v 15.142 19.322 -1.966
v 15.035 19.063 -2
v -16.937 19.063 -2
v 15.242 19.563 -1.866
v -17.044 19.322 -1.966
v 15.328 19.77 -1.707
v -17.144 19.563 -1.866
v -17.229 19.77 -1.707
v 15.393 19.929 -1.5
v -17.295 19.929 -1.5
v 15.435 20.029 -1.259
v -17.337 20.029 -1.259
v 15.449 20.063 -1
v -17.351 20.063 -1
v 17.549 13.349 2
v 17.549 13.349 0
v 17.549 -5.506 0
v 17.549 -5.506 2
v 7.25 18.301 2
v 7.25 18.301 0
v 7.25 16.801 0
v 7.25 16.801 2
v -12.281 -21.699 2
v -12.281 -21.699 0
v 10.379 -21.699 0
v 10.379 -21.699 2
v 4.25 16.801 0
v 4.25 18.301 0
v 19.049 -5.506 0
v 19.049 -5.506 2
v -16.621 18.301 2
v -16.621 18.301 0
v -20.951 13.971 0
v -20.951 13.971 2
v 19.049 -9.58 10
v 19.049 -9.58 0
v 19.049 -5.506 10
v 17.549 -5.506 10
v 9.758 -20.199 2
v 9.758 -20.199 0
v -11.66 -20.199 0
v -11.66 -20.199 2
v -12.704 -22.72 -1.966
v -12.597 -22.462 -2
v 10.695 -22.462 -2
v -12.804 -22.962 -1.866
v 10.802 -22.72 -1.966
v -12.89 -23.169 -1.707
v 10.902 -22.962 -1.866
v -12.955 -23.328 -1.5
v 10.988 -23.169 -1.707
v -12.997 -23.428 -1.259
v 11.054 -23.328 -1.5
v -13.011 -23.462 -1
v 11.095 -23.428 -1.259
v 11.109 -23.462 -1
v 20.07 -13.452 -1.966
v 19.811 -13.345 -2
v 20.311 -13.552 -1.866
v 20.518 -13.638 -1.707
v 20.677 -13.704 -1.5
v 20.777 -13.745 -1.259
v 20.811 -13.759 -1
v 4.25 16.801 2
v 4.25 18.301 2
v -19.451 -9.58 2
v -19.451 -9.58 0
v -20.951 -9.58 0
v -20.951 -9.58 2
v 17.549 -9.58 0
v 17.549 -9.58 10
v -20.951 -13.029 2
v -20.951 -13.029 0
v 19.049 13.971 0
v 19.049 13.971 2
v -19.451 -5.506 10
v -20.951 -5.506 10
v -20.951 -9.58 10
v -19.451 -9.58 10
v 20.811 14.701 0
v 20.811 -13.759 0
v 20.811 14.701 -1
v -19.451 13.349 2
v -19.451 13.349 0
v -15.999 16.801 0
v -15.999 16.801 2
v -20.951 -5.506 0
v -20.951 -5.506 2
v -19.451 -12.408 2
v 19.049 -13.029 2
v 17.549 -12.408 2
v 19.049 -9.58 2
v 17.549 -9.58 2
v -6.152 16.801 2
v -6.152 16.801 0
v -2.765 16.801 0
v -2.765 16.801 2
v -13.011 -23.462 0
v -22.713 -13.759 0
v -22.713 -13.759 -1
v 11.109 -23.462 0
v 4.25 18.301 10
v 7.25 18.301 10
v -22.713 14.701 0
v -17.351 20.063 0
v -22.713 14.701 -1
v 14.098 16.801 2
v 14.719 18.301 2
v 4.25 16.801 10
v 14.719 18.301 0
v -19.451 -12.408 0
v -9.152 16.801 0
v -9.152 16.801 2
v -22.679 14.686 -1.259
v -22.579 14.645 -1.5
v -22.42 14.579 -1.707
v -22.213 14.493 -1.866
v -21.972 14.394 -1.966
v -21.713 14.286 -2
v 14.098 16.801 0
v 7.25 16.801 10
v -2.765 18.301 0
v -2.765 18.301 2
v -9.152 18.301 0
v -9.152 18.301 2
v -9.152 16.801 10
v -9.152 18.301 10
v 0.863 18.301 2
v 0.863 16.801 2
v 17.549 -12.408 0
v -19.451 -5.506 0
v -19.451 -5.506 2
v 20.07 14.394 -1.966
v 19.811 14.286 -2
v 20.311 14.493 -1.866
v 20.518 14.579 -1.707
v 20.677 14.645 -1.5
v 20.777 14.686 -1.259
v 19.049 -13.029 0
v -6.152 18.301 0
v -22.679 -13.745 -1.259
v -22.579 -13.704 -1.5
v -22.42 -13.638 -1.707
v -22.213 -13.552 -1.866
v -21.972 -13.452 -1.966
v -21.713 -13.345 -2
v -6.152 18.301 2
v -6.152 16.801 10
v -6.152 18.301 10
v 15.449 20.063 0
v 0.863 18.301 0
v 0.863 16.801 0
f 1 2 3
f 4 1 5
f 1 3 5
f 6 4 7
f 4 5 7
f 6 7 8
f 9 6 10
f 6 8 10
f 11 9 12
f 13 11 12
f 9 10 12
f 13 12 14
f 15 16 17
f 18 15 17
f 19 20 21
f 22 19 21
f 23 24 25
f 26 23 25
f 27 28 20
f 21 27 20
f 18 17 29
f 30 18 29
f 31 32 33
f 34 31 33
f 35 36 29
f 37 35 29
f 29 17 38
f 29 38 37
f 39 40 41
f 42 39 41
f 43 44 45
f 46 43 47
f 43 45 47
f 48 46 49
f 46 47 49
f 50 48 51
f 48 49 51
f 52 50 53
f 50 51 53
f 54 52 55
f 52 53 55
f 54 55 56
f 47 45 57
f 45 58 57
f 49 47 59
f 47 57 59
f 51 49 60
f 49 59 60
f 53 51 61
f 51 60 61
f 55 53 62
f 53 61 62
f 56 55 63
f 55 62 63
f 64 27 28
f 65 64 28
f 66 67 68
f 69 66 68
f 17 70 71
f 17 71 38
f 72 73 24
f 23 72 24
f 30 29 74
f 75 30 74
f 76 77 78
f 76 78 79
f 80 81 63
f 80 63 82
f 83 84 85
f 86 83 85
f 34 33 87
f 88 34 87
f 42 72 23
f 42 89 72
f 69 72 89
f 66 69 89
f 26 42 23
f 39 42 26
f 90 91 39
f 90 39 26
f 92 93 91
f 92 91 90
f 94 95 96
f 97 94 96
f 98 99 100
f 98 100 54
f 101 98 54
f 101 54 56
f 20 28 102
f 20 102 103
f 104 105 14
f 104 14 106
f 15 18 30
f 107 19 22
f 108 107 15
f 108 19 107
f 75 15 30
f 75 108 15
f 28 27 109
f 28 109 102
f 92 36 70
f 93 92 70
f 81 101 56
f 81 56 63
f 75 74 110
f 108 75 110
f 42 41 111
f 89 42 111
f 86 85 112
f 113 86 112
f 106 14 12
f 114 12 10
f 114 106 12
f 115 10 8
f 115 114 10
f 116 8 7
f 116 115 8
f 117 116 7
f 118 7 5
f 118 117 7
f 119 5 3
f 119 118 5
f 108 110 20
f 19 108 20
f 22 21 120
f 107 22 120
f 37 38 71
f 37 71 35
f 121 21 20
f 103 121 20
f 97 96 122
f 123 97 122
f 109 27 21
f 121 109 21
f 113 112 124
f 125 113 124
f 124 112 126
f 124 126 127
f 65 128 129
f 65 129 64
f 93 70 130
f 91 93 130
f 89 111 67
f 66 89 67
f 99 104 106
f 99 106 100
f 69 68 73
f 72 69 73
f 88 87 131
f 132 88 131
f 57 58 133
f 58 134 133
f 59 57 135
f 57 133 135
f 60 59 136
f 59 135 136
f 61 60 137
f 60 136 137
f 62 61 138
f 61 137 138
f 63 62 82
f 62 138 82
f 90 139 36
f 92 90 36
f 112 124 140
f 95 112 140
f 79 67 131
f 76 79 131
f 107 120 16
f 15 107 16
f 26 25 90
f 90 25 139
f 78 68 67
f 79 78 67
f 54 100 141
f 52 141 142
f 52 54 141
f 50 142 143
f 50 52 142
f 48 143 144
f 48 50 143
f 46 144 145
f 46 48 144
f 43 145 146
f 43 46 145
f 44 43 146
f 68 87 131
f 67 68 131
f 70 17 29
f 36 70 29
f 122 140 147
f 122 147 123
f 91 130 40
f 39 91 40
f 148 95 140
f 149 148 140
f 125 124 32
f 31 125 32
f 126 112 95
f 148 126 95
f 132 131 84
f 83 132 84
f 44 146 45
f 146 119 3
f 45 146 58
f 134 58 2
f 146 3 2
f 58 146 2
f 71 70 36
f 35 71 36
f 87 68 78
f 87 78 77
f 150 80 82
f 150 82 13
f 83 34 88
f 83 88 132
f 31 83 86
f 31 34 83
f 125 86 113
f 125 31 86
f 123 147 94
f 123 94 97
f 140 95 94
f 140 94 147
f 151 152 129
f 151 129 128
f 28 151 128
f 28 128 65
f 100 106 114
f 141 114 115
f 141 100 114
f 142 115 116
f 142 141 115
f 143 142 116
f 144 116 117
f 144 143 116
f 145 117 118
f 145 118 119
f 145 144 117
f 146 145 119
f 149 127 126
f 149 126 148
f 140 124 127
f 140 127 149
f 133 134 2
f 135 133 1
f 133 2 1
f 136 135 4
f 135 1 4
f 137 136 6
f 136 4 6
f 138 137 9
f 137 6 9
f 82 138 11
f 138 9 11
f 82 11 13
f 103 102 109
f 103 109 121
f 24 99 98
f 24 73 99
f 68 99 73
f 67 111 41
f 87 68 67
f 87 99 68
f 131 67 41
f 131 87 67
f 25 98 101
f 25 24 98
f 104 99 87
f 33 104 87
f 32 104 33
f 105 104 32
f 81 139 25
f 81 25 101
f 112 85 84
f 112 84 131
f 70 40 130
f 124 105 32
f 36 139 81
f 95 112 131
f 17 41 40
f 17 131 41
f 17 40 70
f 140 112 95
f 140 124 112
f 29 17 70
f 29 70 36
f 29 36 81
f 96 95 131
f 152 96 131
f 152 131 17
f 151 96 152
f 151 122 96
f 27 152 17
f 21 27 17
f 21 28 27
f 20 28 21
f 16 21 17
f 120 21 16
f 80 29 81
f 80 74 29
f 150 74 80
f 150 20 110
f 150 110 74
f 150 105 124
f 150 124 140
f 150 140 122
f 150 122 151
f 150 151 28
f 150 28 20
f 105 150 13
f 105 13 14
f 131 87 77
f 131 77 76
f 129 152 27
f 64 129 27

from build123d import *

# Parameters (mm, degrees)
F0_W     = 1.4999995628
F0_H     = 4.0733087808
F0_W_2   = 3
F0_H_2   = 1.4999995628
F0_W_3   = 3.3865806442
F0_W_4   = 3.6284167378
F1_DEPTH = 2
F2_DEPTH = 2
F3_DEPTH = 10
F4_R     = 1


# Not quite as in the source:
# - a feature names something its author has since deleted; it is built from what else it names


with BuildPart() as f1:
    # F0 (on Top) → F1 (new body)
    with BuildSketch(Plane.XY):
        Polygon((-22.7132121537, 14.7005723555), (-22.7132121537, -13.7593665438), (-13.0109889089, -23.4615897885), (11.1091688922, -23.4615897885), (20.811392137, -13.7593665438), (20.811392137, 14.7005723555), (15.4489499903, 20.0630145022), (-17.350770007, 20.0630145022), align=None)
        Polygon((19.0490899916, -13.0293970941), (10.3791994426, -21.6992876432), (-12.2810194593, -21.6992876432), (-20.9509100084, -13.0293970941), (-20.9509100084, -9.5797898248), (-20.9509100084, -5.506481044), (-20.9509100084, 13.9706029059), (-16.6208005574, 18.3007123568), (-9.1516990215, 18.3007123568), (-6.1516990215, 18.3007123568), (-2.7651183773, 18.3007123568), (0.8632983606, 18.3007123568), (4.2498790047, 18.3007123568), (7.2498790047, 18.3007123568), (14.7189805407, 18.3007123568), (19.0490899916, 13.9706029059), (19.0490899916, -5.506481044), (19.0490899916, -9.5797898248), align=None, mode=Mode.SUBTRACT)
        Polygon((-12.2810194593, -21.6992876432), (10.3791994426, -21.6992876432), (19.0490899916, -13.0293970941), (19.0490899916, -9.5797898248), (17.5490904289, -9.5797898248), (17.5490904289, -12.4080769317), (9.7578792802, -20.1992880804), (-11.6596992969, -20.1992880804), (-19.4509104456, -12.4080769317), (-19.4509104456, -9.5797898248), (-20.9509100084, -9.5797898248), (-20.9509100084, -13.0293970941), align=None)
        with Locations((18.2990902103, -7.5431354344)):
            Rectangle(F0_W, F0_H)
        Polygon((17.5490904289, -5.506481044), (19.0490899916, -5.506481044), (19.0490899916, 13.9706029059), (14.7189805407, 18.3007123568), (7.2498790047, 18.3007123568), (7.2498790047, 16.8007127941), (14.0976603782, 16.8007127941), (17.5490904289, 13.3492827434), align=None)
        Polygon((17.5490904289, -12.4080769317), (17.5490904289, -9.5797898248), (17.5490904289, -5.506481044), (17.5490904289, 13.3492827434), (14.0976603782, 16.8007127941), (7.2498790047, 16.8007127941), (4.2498790047, 16.8007127941), (0.8632983606, 16.8007127941), (-2.7651183773, 16.8007127941), (-6.1516990215, 16.8007127941), (-9.1516990215, 16.8007127941), (-15.9994803949, 16.8007127941), (-19.4509104456, 13.3492827434), (-19.4509104456, -5.506481044), (-19.4509104456, -9.5797898248), (-19.4509104456, -12.4080769317), (-11.6596992969, -20.1992880804), (9.7578792802, -20.1992880804), align=None)
        Polygon((-20.9509100084, 13.9706029059), (-20.9509100084, -5.506481044), (-19.4509104456, -5.506481044), (-19.4509104456, 13.3492827434), (-15.9994803949, 16.8007127941), (-9.1516990215, 16.8007127941), (-9.1516990215, 18.3007123568), (-16.6208005574, 18.3007123568), align=None)
        with Locations((-20.200910227, -7.5431354344)):
            Rectangle(F0_W, F0_H)
        with Locations((5.7498790047, 17.5507125754)):
            Rectangle(F0_W_2, F0_H_2)
        with Locations((-4.4584086994, 17.5507125754)):
            Rectangle(F0_W_3, F0_H_2)
        with Locations((-7.6516990215, 17.5507125754)):
            Rectangle(F0_W_2, F0_H_2)
        with Locations((2.5565886827, 17.5507125754)):
            Rectangle(F0_W_3, F0_H_2)
        with Locations((-0.9509100084, 17.5507125754)):
            Rectangle(F0_W_4, F0_H_2)
    extrude(amount=-F1_DEPTH)

    # F0 (on Top) → F2 (join)
    with BuildSketch(Plane.XY):
        Polygon((-12.2810194593, -21.6992876432), (10.3791994426, -21.6992876432), (19.0490899916, -13.0293970941), (19.0490899916, -9.5797898248), (17.5490904289, -9.5797898248), (17.5490904289, -12.4080769317), (9.7578792802, -20.1992880804), (-11.6596992969, -20.1992880804), (-19.4509104456, -12.4080769317), (-19.4509104456, -9.5797898248), (-20.9509100084, -9.5797898248), (-20.9509100084, -13.0293970941), align=None)
        Polygon((-20.9509100084, 13.9706029059), (-20.9509100084, -5.506481044), (-19.4509104456, -5.506481044), (-19.4509104456, 13.3492827434), (-15.9994803949, 16.8007127941), (-9.1516990215, 16.8007127941), (-9.1516990215, 18.3007123568), (-16.6208005574, 18.3007123568), align=None)
        Polygon((17.5490904289, -5.506481044), (19.0490899916, -5.506481044), (19.0490899916, 13.9706029059), (14.7189805407, 18.3007123568), (7.2498790047, 18.3007123568), (7.2498790047, 16.8007127941), (14.0976603782, 16.8007127941), (17.5490904289, 13.3492827434), align=None)
        with Locations((-4.4584086994, 17.5507125754)):
            Rectangle(F0_W_3, F0_H_2)
        with Locations((2.5565886827, 17.5507125754)):
            Rectangle(F0_W_3, F0_H_2)
    extrude(amount=F2_DEPTH)

    # F4
    f4_edges = [f1.edges().sort_by_distance(p)[0] for p in [
        (-22.713212, 0.470603, -2),
        (-17.862101, -18.610478, -2),
        (-0.95091, -23.46159, -2),
        (15.960281, -18.610478, -2),
        (20.811392, 0.470603, -2),
        (18.130171, 17.381793, -2),
        (-0.95091, 20.063015, -2),
        (-20.031991, 17.381793, -2),
    ]]
    fillet(f4_edges, radius=F4_R)


with BuildPart() as f3:
    # F0 (on Top) → F3 (new body)
    with BuildSketch(Plane.XY):
        with Locations((-20.200910227, -7.5431354344)):
            Rectangle(F0_W, F0_H)
    extrude(amount=F3_DEPTH)


with BuildPart() as f3b:
    # F0 (on Top) → F3, piece 2 (new body)
    with BuildSketch(Plane.XY):
        with Locations((18.2990902103, -7.5431354344)):
            Rectangle(F0_W, F0_H)
    extrude(amount=F3_DEPTH)


with BuildPart() as f3c:
    # F0 (on Top) → F3, piece 3 (new body)
    with BuildSketch(Plane.XY):
        with Locations((-7.6516990215, 17.5507125754)):
            Rectangle(F0_W_2, F0_H_2)
    extrude(amount=F3_DEPTH)


with BuildPart() as f3d:
    # F0 (on Top) → F3, piece 4 (new body)
    with BuildSketch(Plane.XY):
        with Locations((5.7498790047, 17.5507125754)):
            Rectangle(F0_W_2, F0_H_2)
    extrude(amount=F3_DEPTH)


solid = Compound([f1.part, f3.part, f3b.part, f3c.part, f3d.part])
